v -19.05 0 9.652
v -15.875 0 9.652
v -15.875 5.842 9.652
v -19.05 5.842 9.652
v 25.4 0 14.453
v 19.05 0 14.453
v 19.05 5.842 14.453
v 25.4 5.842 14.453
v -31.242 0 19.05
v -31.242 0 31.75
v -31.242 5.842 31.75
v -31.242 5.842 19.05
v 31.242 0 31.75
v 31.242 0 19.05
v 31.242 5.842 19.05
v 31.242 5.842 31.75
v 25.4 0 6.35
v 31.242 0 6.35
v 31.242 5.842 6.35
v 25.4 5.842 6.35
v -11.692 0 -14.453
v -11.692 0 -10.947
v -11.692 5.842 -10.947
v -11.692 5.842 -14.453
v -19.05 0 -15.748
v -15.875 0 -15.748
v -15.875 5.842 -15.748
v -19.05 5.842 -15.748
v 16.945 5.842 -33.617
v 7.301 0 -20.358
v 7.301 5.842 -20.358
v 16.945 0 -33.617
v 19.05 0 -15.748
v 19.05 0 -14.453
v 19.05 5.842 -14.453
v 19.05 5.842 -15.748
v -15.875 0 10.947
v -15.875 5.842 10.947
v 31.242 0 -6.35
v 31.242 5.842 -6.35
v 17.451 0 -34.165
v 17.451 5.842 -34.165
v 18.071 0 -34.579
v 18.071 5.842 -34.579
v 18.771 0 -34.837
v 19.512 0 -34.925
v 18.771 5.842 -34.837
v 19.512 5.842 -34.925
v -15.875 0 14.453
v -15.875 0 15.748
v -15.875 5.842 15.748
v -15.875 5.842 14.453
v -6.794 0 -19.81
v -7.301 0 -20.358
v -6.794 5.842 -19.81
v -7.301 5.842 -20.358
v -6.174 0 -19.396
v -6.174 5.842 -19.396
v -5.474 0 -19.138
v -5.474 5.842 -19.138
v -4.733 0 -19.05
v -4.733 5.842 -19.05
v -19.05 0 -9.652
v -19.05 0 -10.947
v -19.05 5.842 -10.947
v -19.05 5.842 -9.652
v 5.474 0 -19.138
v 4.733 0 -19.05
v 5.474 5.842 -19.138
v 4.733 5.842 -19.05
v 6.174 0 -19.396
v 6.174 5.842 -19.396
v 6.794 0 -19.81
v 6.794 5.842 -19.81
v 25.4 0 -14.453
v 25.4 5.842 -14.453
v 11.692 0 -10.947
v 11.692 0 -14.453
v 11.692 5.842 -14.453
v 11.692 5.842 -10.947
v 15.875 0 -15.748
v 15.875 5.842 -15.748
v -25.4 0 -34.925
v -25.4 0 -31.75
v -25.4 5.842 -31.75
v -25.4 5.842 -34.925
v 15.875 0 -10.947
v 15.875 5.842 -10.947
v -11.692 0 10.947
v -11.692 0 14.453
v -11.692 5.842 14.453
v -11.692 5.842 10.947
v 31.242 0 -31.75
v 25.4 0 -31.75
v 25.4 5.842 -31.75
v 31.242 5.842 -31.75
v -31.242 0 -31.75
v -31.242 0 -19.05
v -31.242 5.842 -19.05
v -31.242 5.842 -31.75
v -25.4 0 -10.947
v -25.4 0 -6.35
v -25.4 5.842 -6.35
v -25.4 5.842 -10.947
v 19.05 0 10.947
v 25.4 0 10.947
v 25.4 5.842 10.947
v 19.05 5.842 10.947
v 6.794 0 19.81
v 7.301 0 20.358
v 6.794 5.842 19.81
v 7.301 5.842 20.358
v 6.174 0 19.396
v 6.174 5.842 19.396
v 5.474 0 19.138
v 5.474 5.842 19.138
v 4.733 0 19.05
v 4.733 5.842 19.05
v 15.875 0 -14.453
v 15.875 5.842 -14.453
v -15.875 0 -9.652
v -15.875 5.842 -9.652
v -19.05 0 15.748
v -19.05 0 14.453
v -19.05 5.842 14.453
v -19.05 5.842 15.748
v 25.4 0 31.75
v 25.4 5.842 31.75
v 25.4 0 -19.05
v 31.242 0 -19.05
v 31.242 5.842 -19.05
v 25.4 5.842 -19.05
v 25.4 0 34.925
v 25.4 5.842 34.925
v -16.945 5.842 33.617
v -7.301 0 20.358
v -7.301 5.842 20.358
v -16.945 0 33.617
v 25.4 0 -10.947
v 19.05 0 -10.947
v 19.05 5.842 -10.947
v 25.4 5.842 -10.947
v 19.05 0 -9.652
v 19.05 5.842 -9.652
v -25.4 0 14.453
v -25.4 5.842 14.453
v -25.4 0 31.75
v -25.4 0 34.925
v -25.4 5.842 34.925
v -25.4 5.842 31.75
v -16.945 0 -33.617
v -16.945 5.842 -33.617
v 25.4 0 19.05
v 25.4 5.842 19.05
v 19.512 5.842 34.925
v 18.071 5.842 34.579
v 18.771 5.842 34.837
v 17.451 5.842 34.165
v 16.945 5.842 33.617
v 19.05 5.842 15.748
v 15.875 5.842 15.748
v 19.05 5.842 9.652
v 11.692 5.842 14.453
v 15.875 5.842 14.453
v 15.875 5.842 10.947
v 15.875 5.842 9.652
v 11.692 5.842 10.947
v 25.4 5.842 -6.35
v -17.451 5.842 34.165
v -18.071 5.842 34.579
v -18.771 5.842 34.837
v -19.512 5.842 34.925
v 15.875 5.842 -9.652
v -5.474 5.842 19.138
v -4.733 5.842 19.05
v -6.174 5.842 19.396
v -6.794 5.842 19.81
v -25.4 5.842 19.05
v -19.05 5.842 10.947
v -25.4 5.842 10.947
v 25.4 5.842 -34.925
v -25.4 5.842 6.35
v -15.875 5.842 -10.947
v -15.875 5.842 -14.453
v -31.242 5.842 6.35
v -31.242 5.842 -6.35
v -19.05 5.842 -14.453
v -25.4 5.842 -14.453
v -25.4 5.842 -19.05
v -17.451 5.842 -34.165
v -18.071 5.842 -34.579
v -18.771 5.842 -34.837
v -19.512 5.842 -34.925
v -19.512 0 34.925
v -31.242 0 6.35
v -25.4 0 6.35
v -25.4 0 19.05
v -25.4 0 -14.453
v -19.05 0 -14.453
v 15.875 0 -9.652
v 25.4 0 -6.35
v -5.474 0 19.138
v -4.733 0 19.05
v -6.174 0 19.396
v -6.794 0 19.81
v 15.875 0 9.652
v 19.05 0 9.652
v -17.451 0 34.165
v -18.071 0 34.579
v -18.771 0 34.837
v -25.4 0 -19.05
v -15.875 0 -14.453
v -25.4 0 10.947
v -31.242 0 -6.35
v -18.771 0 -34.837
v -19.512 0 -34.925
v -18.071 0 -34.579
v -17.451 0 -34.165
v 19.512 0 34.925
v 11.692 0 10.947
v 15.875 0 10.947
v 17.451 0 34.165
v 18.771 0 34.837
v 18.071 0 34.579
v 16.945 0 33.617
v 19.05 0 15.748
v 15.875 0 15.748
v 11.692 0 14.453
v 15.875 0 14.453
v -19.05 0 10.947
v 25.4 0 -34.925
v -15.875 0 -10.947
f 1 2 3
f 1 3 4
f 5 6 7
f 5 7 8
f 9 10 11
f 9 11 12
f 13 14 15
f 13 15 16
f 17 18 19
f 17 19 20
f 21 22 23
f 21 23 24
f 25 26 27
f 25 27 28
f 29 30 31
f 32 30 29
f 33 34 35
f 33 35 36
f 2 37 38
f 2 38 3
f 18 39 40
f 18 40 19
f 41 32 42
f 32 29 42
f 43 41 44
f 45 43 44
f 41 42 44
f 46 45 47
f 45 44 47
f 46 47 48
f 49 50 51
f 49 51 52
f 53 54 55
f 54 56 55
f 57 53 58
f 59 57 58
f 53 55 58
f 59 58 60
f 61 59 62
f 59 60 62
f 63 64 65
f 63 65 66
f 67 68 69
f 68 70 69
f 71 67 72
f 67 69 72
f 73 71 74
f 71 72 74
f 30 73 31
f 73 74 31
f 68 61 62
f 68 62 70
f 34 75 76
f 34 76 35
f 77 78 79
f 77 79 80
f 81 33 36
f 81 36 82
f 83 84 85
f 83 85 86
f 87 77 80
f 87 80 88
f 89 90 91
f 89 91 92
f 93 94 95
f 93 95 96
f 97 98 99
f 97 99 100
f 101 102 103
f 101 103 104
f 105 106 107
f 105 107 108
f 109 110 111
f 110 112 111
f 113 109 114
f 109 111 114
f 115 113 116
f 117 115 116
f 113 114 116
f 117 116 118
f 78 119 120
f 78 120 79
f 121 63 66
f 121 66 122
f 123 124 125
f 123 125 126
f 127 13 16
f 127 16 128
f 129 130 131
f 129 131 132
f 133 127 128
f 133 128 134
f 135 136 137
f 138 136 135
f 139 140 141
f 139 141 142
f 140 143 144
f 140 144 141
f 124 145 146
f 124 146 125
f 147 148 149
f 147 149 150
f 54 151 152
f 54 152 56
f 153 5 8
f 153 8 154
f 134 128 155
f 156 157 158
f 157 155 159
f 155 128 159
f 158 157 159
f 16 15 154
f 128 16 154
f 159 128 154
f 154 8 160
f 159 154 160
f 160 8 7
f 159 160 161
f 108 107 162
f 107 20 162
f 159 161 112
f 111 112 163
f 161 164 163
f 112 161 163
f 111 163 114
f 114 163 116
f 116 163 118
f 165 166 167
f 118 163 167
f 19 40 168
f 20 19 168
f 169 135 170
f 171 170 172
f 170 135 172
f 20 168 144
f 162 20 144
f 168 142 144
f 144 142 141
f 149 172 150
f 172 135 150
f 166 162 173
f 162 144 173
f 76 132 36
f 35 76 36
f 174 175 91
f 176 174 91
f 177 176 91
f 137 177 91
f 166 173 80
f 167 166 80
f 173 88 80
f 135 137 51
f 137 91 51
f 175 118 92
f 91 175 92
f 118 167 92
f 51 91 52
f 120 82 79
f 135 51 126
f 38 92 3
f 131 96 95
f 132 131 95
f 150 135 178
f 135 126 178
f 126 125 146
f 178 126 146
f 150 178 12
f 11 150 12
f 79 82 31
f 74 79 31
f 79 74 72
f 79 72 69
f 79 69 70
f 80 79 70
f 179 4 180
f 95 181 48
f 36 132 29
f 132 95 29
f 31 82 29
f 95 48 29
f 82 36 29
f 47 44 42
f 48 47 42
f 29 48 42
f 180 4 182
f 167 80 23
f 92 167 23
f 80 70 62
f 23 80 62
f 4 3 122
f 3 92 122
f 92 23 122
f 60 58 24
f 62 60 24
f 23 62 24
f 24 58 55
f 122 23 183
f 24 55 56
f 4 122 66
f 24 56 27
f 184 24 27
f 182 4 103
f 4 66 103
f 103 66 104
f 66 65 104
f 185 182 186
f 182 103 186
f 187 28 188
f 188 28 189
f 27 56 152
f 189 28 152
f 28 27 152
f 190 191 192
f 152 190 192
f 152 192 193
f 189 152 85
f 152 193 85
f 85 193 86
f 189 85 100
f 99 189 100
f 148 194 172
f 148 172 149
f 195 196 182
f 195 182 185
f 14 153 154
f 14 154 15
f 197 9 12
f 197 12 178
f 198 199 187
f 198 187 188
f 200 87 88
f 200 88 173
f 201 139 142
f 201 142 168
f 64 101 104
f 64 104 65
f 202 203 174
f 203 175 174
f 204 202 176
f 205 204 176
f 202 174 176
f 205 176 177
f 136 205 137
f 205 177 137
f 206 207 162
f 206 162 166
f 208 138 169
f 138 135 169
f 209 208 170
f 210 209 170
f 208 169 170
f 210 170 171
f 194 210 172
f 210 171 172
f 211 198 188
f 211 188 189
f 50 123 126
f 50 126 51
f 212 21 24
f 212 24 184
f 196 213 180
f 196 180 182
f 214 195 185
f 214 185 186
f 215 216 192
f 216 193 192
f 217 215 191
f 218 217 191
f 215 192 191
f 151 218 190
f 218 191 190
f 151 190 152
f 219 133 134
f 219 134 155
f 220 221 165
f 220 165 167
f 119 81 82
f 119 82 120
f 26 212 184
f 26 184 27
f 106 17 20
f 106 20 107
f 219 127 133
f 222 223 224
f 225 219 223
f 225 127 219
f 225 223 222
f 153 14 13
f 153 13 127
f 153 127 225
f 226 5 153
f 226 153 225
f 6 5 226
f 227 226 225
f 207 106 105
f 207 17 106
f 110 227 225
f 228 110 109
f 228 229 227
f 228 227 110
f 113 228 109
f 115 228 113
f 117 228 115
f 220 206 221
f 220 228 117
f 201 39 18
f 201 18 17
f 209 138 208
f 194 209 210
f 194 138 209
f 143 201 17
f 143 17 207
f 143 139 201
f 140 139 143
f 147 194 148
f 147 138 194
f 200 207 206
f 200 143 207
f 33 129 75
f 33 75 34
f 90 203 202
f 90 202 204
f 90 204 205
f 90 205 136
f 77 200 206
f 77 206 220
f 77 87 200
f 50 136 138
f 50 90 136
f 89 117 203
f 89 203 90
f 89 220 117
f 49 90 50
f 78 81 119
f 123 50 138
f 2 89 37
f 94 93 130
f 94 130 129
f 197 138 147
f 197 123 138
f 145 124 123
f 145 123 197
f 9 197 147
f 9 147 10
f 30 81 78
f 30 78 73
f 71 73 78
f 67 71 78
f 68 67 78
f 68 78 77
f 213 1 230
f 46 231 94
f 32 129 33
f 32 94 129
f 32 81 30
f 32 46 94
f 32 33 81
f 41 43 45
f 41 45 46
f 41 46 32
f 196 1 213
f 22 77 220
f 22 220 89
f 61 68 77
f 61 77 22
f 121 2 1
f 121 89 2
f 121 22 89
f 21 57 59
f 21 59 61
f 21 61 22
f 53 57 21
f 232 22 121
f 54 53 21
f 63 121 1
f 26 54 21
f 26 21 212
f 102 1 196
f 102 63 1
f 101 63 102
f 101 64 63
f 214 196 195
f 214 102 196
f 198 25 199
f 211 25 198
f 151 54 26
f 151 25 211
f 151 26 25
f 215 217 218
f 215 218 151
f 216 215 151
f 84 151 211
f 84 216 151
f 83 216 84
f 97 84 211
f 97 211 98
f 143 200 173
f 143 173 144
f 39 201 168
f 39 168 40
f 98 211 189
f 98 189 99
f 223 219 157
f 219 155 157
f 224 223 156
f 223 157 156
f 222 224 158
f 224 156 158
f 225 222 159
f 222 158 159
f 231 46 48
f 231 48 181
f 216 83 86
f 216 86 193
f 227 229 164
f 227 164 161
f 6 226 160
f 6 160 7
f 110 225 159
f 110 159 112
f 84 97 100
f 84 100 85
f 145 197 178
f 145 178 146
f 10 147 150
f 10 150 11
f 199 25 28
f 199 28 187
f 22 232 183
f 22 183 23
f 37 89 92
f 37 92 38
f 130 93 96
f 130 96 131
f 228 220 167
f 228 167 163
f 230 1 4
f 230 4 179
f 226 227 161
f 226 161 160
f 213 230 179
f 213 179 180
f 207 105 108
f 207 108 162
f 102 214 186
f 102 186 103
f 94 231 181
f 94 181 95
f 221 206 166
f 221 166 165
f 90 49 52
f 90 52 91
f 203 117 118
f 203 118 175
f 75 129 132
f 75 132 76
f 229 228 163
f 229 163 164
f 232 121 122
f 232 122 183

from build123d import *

# Parameters (mm, degrees)
BOSS_EXTRUDE1_DEPTH = 5.842
FILLET1_R           = 3.175


with BuildPart() as part:
    # Sketch1 → Boss-Extrude1 (new body)
    with BuildSketch(Plane(origin=(0, 0, 0), x_dir=(1, 0, 0), z_dir=(0, 1, 0))):
        Polygon((25.4, -34.925), (17.895454545, -34.925), (6.35, -19.05), (-6.35, -19.05), (-17.895454545, -34.925), (-25.4, -34.925), (-25.4, -31.75), (-31.242, -31.75), (-31.242, -19.05), (-25.4, -19.05), (-25.4, -14.4526), (-19.05, -14.4526), (-19.05, -15.748), (-15.875, -15.748), (-15.875, -14.4526), (-11.692, -14.4526), (-11.692, -10.9474), (-15.875, -10.9474), (-15.875, -9.652), (-19.05, -9.652), (-19.05, -10.9474), (-25.4, -10.9474), (-25.4, -6.35), (-31.242, -6.35), (-31.242, 6.35), (-25.4, 6.35), (-25.4, 10.9474), (-19.05, 10.9474), (-19.05, 9.652), (-15.875, 9.652), (-15.875, 10.9474), (-11.692, 10.9474), (-11.692, 14.4526), (-15.875, 14.4526), (-15.875, 15.748), (-19.05, 15.748), (-19.05, 14.4526), (-25.4, 14.4526), (-25.4, 19.05), (-31.242, 19.05), (-31.242, 31.75), (-25.4, 31.75), (-25.4, 34.925), (-17.895454545, 34.925), (-6.35, 19.05), (6.35, 19.05), (17.895454545, 34.925), (25.4, 34.925), (25.4, 31.75), (31.242, 31.75), (31.242, 19.05), (25.4, 19.05), (25.4, 14.4526), (19.05, 14.4526), (19.05, 15.748), (15.875, 15.748), (15.875, 14.4526), (11.692, 14.4526), (11.692, 10.9474), (15.875, 10.9474), (15.875, 9.652), (19.05, 9.652), (19.05, 10.9474), (25.4, 10.9474), (25.4, 6.35), (31.242, 6.35), (31.242, -6.35), (25.4, -6.35), (25.4, -10.9474), (19.05, -10.9474), (19.05, -9.652), (15.875, -9.652), (15.875, -10.9474), (11.692, -10.9474), (11.692, -14.4526), (15.875, -14.4526), (15.875, -15.748), (19.05, -15.748), (19.05, -14.4526), (25.4, -14.4526), (25.4, -19.05), (31.242, -19.05), (31.242, -31.75), (25.4, -31.75), align=None)
    extrude(amount=BOSS_EXTRUDE1_DEPTH)

    # Fillet1
    fillet1_edges = [part.edges().sort_by_distance(p)[0] for p in [
        (-17.895454545, 2.921, -34.925),
        (-6.35, 2.921, -19.05),
        (6.35, 2.921, -19.05),
        (17.895454545, 2.921, -34.925),
        (17.895454545, 2.921, 34.925),
        (6.35, 2.921, 19.05),
        (-6.35, 2.921, 19.05),
        (-17.895454545, 2.921, 34.925),
    ]]
    fillet(fillet1_edges, radius=FILLET1_R)


solid = part.part
